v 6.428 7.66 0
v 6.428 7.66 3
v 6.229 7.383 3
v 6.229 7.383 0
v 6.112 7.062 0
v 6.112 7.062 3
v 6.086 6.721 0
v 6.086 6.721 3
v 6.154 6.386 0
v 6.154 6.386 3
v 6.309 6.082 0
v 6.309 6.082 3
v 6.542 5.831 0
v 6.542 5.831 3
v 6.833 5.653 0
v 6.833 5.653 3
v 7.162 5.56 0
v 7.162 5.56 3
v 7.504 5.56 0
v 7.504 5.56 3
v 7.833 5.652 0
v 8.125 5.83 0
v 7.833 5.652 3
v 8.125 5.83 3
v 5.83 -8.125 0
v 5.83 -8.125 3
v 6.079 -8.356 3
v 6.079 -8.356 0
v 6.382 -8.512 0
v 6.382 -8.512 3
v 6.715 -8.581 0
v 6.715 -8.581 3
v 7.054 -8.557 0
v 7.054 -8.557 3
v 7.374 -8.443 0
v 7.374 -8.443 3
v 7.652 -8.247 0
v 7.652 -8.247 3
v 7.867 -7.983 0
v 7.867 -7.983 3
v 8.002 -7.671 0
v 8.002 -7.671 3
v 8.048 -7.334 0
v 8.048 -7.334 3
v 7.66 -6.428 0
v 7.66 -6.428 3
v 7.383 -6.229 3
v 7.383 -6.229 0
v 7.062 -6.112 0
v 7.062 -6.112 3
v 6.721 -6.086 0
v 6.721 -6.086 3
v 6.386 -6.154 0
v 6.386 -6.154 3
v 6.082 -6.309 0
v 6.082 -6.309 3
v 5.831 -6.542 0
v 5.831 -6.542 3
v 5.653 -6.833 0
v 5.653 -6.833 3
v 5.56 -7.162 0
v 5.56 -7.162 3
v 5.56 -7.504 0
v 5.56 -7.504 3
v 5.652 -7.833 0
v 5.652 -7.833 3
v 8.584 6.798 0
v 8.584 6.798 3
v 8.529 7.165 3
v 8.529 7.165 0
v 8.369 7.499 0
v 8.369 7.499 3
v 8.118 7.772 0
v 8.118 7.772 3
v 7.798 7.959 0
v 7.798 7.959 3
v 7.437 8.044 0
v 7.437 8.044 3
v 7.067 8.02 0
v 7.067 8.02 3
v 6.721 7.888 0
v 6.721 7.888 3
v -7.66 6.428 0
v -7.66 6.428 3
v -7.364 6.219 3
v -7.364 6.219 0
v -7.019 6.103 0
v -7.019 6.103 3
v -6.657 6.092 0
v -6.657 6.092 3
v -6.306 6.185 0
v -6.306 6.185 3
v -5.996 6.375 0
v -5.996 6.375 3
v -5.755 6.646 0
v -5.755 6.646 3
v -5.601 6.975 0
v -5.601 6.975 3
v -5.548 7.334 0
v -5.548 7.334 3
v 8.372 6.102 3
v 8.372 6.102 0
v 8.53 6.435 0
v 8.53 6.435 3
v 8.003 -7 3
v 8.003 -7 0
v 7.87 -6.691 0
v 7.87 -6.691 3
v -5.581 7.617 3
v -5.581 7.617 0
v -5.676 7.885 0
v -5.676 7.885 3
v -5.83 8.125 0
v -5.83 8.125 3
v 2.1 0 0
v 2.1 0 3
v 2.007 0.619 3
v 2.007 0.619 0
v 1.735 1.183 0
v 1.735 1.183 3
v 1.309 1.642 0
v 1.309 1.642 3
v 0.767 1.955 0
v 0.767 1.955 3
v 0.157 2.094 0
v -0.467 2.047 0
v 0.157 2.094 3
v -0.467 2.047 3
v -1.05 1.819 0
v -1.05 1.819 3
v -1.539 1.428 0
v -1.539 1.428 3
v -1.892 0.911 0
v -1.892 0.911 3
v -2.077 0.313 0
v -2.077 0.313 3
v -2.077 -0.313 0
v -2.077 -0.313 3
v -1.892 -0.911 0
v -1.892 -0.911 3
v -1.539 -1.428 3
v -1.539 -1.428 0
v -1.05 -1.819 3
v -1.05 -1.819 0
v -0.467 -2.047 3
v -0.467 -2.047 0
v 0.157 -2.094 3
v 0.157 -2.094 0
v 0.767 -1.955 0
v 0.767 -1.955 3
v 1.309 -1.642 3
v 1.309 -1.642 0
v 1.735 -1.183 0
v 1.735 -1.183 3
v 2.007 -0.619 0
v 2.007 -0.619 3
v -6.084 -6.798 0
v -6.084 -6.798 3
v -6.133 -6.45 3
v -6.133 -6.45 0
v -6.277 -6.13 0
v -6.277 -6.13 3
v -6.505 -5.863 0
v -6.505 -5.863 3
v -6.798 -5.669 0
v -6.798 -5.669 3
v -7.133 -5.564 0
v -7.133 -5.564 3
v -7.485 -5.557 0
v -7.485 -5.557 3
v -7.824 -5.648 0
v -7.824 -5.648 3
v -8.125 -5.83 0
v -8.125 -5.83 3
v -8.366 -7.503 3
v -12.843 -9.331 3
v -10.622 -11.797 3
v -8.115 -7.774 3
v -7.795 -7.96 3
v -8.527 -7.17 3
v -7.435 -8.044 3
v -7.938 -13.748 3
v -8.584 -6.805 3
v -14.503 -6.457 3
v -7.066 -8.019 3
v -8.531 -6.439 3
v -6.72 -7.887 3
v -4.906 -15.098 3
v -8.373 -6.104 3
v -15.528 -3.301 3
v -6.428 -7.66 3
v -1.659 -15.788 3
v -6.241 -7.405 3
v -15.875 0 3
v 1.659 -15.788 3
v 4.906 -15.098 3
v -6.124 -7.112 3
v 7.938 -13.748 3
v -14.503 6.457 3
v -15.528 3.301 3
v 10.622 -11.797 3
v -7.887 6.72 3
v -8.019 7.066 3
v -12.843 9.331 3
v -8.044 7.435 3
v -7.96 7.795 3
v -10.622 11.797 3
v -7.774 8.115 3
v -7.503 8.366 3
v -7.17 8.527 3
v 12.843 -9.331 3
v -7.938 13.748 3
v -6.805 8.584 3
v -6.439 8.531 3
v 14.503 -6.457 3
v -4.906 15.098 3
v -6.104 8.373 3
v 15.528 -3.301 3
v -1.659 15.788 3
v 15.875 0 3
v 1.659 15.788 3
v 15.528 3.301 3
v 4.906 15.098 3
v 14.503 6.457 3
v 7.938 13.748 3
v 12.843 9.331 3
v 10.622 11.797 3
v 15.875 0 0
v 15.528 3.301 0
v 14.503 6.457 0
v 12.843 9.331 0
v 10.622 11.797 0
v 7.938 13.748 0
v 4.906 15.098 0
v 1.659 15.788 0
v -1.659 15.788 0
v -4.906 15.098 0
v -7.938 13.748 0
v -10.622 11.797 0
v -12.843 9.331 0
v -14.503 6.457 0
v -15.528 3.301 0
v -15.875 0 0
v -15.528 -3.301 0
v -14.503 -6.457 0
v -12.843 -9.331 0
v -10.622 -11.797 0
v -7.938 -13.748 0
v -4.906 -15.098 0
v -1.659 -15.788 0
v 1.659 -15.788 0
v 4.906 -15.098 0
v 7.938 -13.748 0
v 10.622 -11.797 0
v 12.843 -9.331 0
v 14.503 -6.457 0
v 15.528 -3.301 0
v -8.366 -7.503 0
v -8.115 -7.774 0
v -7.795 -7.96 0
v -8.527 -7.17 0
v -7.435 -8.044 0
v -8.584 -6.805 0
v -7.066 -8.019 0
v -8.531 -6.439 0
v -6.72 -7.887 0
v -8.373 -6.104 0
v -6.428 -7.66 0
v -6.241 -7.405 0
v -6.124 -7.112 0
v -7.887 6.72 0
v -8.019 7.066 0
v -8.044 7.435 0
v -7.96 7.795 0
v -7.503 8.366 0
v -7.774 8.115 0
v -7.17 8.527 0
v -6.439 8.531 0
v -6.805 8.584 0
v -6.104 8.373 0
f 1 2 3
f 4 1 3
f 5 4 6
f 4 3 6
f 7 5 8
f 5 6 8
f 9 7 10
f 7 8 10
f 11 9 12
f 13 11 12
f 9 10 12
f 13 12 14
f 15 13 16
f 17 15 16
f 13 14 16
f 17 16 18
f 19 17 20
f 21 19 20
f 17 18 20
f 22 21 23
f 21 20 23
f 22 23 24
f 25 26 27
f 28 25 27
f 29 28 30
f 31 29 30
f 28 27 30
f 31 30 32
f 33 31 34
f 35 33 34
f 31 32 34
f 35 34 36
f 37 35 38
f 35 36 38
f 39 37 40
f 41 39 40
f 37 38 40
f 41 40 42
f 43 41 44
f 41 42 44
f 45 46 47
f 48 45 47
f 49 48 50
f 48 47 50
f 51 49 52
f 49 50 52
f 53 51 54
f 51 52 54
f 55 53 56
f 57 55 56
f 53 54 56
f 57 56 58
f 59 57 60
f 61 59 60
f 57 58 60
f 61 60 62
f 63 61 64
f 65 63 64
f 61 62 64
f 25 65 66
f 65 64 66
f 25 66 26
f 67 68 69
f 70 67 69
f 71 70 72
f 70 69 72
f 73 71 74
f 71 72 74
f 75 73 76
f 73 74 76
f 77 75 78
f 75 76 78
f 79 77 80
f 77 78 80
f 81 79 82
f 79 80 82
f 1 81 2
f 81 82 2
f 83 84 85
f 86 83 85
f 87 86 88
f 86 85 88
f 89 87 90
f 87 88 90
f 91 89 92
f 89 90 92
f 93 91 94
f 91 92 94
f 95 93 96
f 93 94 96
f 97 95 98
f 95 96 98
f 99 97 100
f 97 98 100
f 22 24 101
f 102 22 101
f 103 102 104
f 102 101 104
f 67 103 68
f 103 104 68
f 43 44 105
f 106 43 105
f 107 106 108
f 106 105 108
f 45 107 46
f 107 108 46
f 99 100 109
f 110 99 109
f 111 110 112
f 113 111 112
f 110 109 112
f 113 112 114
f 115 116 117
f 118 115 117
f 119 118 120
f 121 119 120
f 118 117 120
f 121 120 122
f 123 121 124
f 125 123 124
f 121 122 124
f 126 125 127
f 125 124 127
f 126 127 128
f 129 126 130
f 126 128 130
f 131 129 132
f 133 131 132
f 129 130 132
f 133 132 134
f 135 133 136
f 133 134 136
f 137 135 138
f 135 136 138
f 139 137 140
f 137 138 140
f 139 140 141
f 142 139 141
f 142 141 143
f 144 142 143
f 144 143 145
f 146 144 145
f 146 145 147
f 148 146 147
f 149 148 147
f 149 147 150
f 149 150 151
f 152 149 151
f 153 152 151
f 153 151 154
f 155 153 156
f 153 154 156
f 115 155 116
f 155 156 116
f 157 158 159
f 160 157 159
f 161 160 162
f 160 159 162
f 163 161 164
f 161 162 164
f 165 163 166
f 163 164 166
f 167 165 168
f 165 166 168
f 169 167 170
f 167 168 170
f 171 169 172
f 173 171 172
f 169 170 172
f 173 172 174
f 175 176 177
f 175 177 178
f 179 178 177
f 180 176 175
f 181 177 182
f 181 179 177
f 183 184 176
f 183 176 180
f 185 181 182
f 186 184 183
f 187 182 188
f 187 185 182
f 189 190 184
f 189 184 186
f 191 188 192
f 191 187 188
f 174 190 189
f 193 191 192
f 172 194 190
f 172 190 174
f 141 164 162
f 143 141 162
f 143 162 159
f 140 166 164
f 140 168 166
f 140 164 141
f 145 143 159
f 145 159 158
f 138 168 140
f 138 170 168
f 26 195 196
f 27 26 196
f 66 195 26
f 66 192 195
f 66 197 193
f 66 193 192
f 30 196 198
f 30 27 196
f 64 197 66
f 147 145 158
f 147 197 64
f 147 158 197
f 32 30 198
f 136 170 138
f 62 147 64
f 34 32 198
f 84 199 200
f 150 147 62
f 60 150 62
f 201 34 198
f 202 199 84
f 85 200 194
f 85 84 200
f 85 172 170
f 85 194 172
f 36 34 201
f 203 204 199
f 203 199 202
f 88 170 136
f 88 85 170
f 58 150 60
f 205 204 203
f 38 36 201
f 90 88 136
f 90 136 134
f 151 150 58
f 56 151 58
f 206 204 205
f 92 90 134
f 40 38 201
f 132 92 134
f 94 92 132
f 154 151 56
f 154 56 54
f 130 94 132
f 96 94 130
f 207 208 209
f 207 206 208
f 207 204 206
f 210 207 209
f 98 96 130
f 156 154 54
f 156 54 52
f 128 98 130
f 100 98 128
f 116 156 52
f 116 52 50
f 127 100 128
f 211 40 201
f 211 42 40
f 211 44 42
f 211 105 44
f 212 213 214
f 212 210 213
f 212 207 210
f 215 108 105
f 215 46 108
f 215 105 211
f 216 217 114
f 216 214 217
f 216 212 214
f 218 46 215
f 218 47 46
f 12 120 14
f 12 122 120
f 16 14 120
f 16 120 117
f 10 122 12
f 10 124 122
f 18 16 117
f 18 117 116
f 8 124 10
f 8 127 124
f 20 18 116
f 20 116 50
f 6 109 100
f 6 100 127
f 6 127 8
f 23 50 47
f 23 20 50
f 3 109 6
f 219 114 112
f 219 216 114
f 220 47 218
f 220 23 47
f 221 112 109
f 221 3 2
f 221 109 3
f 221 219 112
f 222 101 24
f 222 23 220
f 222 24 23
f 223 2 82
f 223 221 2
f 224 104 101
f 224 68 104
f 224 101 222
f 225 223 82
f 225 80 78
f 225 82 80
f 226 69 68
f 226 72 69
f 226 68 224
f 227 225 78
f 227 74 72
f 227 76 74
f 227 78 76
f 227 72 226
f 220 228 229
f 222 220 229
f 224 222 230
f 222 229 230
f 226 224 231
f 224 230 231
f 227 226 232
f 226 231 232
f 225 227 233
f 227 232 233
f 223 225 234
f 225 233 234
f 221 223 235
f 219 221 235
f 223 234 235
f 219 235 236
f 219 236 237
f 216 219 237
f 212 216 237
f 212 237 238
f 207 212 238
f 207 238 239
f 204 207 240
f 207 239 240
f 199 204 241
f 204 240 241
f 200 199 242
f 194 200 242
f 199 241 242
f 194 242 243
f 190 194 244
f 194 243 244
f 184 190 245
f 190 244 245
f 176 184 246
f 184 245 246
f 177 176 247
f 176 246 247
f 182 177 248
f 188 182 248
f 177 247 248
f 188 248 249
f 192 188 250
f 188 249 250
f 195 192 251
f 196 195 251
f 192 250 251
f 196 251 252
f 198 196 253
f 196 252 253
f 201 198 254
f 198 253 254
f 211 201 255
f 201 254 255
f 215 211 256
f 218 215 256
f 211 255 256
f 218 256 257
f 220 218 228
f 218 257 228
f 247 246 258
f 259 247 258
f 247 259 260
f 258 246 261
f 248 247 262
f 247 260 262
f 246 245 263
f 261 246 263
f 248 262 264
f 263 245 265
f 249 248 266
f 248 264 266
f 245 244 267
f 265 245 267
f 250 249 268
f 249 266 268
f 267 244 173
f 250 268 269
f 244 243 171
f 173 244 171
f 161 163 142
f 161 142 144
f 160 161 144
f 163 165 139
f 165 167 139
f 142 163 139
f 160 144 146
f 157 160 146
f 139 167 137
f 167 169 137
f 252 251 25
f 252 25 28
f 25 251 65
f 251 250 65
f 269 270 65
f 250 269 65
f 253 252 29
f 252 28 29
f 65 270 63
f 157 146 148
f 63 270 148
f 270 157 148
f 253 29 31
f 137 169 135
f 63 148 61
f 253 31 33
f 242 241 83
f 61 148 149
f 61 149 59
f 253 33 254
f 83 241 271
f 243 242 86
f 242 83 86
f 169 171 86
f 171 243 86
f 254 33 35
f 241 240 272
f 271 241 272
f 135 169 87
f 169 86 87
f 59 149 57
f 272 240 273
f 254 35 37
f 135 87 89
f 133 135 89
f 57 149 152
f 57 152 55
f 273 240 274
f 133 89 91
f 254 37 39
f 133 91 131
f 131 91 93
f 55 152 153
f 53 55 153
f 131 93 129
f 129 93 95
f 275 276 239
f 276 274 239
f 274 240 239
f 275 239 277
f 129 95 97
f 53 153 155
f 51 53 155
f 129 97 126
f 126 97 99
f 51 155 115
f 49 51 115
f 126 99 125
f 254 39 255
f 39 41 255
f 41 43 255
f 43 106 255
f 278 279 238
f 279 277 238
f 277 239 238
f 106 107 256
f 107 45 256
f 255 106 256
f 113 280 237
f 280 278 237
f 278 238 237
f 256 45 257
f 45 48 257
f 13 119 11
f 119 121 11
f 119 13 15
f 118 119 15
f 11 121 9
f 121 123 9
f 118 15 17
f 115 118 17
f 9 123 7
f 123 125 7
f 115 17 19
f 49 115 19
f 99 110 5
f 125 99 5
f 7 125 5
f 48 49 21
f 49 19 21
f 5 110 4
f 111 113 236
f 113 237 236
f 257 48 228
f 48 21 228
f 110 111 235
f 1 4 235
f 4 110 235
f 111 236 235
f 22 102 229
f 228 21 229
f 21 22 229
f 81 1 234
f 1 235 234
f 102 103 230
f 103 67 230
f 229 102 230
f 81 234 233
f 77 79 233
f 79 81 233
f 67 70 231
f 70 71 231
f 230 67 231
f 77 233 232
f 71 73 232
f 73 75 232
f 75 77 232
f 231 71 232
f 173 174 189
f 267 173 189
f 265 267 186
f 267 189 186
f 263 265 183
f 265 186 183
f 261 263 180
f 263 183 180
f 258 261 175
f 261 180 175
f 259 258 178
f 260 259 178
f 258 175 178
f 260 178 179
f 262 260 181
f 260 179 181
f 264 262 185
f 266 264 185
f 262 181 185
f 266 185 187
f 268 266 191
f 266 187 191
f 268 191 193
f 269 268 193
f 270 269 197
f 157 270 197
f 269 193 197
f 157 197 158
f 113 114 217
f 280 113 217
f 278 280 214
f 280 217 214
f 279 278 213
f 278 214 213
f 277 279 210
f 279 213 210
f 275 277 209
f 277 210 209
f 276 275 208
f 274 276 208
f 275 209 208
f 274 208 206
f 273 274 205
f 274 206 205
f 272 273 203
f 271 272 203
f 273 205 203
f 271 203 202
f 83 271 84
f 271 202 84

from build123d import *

# Parameters (mm, degrees)
F0_R     = 15.875
F1_DEPTH = 3
F3_DEPTH = 5
F4_R     = 2.1
F5_DEPTH = 3


with BuildPart() as f1:
    # F0 (on Top) → F1 (new body)
    with BuildSketch(Plane.XY):
        Circle(F0_R)
    extrude(amount=F1_DEPTH)

    # F2 (on face) → F3 (cut)
    with BuildSketch(Plane.XY.offset(3)):
        with BuildLine():
            ThreePointArc((-5.83022, 8.124563), (-6.798257, 7.333737), (-7.66007, 6.428322))
            ThreePointArc((-7.66007, 6.428322), (-6.305696, 6.184876), (-5.548257, 7.333737))
            ThreePointArc((-5.548257, 7.333737), (-5.620856, 7.753532), (-5.83022, 8.124563))
        make_face()
        with BuildLine():
            ThreePointArc((-5.83022, 8.124563), (-7.648039, 8.250455), (-7.66007, 6.428322))
            ThreePointArc((-7.66007, 6.428322), (-6.798257, 7.333737), (-5.83022, 8.124563))
        make_face()
        with BuildLine():
            ThreePointArc((8.583737, 6.798257), (7.797812, 7.958918), (6.428322, 7.66007))
            ThreePointArc((6.428322, 7.66007), (7.333737, 6.798257), (8.124563, 5.83022))
            ThreePointArc((8.124563, 5.83022), (8.463125, 6.262548), (8.583737, 6.798257))
        make_face()
        with BuildLine():
            ThreePointArc((8.124563, 5.83022), (7.333737, 6.798257), (6.428322, 7.66007))
            ThreePointArc((6.428322, 7.66007), (6.41702, 5.948475), (8.124563, 5.83022))
        make_face()
        with BuildLine():
            ThreePointArc((7.66007, -6.428322), (6.798257, -7.333737), (5.83022, -8.124563))
            ThreePointArc((5.83022, -8.124563), (7.218051, -8.511138), (8.048257, -7.333737))
            ThreePointArc((8.048257, -7.333737), (7.947119, -6.841176), (7.66007, -6.428322))
        make_face()
        with BuildLine():
            ThreePointArc((7.66007, -6.428322), (5.948475, -6.41702), (5.83022, -8.124563))
            ThreePointArc((5.83022, -8.124563), (6.798257, -7.333737), (7.66007, -6.428322))
        make_face()
        with BuildLine():
            ThreePointArc((-6.428322, -7.66007), (-7.333737, -6.798257), (-8.124563, -5.83022))
            ThreePointArc((-8.124563, -5.83022), (-8.250455, -7.648039), (-6.428322, -7.66007))
        make_face()
        with BuildLine():
            ThreePointArc((-6.428322, -7.66007), (-6.173076, -7.262331), (-6.083737, -6.798257))
            ThreePointArc((-6.083737, -6.798257), (-6.798029, -5.668869), (-8.124563, -5.83022))
            ThreePointArc((-8.124563, -5.83022), (-7.333737, -6.798257), (-6.428322, -7.66007))
        make_face()
    extrude(amount=-F3_DEPTH, mode=Mode.SUBTRACT)

    # F4 (on face) → F5 (cut, through all)
    with BuildSketch(Plane.XY.offset(3)):
        Circle(F4_R)
    extrude(amount=-F5_DEPTH, mode=Mode.SUBTRACT)


solid = f1.part
